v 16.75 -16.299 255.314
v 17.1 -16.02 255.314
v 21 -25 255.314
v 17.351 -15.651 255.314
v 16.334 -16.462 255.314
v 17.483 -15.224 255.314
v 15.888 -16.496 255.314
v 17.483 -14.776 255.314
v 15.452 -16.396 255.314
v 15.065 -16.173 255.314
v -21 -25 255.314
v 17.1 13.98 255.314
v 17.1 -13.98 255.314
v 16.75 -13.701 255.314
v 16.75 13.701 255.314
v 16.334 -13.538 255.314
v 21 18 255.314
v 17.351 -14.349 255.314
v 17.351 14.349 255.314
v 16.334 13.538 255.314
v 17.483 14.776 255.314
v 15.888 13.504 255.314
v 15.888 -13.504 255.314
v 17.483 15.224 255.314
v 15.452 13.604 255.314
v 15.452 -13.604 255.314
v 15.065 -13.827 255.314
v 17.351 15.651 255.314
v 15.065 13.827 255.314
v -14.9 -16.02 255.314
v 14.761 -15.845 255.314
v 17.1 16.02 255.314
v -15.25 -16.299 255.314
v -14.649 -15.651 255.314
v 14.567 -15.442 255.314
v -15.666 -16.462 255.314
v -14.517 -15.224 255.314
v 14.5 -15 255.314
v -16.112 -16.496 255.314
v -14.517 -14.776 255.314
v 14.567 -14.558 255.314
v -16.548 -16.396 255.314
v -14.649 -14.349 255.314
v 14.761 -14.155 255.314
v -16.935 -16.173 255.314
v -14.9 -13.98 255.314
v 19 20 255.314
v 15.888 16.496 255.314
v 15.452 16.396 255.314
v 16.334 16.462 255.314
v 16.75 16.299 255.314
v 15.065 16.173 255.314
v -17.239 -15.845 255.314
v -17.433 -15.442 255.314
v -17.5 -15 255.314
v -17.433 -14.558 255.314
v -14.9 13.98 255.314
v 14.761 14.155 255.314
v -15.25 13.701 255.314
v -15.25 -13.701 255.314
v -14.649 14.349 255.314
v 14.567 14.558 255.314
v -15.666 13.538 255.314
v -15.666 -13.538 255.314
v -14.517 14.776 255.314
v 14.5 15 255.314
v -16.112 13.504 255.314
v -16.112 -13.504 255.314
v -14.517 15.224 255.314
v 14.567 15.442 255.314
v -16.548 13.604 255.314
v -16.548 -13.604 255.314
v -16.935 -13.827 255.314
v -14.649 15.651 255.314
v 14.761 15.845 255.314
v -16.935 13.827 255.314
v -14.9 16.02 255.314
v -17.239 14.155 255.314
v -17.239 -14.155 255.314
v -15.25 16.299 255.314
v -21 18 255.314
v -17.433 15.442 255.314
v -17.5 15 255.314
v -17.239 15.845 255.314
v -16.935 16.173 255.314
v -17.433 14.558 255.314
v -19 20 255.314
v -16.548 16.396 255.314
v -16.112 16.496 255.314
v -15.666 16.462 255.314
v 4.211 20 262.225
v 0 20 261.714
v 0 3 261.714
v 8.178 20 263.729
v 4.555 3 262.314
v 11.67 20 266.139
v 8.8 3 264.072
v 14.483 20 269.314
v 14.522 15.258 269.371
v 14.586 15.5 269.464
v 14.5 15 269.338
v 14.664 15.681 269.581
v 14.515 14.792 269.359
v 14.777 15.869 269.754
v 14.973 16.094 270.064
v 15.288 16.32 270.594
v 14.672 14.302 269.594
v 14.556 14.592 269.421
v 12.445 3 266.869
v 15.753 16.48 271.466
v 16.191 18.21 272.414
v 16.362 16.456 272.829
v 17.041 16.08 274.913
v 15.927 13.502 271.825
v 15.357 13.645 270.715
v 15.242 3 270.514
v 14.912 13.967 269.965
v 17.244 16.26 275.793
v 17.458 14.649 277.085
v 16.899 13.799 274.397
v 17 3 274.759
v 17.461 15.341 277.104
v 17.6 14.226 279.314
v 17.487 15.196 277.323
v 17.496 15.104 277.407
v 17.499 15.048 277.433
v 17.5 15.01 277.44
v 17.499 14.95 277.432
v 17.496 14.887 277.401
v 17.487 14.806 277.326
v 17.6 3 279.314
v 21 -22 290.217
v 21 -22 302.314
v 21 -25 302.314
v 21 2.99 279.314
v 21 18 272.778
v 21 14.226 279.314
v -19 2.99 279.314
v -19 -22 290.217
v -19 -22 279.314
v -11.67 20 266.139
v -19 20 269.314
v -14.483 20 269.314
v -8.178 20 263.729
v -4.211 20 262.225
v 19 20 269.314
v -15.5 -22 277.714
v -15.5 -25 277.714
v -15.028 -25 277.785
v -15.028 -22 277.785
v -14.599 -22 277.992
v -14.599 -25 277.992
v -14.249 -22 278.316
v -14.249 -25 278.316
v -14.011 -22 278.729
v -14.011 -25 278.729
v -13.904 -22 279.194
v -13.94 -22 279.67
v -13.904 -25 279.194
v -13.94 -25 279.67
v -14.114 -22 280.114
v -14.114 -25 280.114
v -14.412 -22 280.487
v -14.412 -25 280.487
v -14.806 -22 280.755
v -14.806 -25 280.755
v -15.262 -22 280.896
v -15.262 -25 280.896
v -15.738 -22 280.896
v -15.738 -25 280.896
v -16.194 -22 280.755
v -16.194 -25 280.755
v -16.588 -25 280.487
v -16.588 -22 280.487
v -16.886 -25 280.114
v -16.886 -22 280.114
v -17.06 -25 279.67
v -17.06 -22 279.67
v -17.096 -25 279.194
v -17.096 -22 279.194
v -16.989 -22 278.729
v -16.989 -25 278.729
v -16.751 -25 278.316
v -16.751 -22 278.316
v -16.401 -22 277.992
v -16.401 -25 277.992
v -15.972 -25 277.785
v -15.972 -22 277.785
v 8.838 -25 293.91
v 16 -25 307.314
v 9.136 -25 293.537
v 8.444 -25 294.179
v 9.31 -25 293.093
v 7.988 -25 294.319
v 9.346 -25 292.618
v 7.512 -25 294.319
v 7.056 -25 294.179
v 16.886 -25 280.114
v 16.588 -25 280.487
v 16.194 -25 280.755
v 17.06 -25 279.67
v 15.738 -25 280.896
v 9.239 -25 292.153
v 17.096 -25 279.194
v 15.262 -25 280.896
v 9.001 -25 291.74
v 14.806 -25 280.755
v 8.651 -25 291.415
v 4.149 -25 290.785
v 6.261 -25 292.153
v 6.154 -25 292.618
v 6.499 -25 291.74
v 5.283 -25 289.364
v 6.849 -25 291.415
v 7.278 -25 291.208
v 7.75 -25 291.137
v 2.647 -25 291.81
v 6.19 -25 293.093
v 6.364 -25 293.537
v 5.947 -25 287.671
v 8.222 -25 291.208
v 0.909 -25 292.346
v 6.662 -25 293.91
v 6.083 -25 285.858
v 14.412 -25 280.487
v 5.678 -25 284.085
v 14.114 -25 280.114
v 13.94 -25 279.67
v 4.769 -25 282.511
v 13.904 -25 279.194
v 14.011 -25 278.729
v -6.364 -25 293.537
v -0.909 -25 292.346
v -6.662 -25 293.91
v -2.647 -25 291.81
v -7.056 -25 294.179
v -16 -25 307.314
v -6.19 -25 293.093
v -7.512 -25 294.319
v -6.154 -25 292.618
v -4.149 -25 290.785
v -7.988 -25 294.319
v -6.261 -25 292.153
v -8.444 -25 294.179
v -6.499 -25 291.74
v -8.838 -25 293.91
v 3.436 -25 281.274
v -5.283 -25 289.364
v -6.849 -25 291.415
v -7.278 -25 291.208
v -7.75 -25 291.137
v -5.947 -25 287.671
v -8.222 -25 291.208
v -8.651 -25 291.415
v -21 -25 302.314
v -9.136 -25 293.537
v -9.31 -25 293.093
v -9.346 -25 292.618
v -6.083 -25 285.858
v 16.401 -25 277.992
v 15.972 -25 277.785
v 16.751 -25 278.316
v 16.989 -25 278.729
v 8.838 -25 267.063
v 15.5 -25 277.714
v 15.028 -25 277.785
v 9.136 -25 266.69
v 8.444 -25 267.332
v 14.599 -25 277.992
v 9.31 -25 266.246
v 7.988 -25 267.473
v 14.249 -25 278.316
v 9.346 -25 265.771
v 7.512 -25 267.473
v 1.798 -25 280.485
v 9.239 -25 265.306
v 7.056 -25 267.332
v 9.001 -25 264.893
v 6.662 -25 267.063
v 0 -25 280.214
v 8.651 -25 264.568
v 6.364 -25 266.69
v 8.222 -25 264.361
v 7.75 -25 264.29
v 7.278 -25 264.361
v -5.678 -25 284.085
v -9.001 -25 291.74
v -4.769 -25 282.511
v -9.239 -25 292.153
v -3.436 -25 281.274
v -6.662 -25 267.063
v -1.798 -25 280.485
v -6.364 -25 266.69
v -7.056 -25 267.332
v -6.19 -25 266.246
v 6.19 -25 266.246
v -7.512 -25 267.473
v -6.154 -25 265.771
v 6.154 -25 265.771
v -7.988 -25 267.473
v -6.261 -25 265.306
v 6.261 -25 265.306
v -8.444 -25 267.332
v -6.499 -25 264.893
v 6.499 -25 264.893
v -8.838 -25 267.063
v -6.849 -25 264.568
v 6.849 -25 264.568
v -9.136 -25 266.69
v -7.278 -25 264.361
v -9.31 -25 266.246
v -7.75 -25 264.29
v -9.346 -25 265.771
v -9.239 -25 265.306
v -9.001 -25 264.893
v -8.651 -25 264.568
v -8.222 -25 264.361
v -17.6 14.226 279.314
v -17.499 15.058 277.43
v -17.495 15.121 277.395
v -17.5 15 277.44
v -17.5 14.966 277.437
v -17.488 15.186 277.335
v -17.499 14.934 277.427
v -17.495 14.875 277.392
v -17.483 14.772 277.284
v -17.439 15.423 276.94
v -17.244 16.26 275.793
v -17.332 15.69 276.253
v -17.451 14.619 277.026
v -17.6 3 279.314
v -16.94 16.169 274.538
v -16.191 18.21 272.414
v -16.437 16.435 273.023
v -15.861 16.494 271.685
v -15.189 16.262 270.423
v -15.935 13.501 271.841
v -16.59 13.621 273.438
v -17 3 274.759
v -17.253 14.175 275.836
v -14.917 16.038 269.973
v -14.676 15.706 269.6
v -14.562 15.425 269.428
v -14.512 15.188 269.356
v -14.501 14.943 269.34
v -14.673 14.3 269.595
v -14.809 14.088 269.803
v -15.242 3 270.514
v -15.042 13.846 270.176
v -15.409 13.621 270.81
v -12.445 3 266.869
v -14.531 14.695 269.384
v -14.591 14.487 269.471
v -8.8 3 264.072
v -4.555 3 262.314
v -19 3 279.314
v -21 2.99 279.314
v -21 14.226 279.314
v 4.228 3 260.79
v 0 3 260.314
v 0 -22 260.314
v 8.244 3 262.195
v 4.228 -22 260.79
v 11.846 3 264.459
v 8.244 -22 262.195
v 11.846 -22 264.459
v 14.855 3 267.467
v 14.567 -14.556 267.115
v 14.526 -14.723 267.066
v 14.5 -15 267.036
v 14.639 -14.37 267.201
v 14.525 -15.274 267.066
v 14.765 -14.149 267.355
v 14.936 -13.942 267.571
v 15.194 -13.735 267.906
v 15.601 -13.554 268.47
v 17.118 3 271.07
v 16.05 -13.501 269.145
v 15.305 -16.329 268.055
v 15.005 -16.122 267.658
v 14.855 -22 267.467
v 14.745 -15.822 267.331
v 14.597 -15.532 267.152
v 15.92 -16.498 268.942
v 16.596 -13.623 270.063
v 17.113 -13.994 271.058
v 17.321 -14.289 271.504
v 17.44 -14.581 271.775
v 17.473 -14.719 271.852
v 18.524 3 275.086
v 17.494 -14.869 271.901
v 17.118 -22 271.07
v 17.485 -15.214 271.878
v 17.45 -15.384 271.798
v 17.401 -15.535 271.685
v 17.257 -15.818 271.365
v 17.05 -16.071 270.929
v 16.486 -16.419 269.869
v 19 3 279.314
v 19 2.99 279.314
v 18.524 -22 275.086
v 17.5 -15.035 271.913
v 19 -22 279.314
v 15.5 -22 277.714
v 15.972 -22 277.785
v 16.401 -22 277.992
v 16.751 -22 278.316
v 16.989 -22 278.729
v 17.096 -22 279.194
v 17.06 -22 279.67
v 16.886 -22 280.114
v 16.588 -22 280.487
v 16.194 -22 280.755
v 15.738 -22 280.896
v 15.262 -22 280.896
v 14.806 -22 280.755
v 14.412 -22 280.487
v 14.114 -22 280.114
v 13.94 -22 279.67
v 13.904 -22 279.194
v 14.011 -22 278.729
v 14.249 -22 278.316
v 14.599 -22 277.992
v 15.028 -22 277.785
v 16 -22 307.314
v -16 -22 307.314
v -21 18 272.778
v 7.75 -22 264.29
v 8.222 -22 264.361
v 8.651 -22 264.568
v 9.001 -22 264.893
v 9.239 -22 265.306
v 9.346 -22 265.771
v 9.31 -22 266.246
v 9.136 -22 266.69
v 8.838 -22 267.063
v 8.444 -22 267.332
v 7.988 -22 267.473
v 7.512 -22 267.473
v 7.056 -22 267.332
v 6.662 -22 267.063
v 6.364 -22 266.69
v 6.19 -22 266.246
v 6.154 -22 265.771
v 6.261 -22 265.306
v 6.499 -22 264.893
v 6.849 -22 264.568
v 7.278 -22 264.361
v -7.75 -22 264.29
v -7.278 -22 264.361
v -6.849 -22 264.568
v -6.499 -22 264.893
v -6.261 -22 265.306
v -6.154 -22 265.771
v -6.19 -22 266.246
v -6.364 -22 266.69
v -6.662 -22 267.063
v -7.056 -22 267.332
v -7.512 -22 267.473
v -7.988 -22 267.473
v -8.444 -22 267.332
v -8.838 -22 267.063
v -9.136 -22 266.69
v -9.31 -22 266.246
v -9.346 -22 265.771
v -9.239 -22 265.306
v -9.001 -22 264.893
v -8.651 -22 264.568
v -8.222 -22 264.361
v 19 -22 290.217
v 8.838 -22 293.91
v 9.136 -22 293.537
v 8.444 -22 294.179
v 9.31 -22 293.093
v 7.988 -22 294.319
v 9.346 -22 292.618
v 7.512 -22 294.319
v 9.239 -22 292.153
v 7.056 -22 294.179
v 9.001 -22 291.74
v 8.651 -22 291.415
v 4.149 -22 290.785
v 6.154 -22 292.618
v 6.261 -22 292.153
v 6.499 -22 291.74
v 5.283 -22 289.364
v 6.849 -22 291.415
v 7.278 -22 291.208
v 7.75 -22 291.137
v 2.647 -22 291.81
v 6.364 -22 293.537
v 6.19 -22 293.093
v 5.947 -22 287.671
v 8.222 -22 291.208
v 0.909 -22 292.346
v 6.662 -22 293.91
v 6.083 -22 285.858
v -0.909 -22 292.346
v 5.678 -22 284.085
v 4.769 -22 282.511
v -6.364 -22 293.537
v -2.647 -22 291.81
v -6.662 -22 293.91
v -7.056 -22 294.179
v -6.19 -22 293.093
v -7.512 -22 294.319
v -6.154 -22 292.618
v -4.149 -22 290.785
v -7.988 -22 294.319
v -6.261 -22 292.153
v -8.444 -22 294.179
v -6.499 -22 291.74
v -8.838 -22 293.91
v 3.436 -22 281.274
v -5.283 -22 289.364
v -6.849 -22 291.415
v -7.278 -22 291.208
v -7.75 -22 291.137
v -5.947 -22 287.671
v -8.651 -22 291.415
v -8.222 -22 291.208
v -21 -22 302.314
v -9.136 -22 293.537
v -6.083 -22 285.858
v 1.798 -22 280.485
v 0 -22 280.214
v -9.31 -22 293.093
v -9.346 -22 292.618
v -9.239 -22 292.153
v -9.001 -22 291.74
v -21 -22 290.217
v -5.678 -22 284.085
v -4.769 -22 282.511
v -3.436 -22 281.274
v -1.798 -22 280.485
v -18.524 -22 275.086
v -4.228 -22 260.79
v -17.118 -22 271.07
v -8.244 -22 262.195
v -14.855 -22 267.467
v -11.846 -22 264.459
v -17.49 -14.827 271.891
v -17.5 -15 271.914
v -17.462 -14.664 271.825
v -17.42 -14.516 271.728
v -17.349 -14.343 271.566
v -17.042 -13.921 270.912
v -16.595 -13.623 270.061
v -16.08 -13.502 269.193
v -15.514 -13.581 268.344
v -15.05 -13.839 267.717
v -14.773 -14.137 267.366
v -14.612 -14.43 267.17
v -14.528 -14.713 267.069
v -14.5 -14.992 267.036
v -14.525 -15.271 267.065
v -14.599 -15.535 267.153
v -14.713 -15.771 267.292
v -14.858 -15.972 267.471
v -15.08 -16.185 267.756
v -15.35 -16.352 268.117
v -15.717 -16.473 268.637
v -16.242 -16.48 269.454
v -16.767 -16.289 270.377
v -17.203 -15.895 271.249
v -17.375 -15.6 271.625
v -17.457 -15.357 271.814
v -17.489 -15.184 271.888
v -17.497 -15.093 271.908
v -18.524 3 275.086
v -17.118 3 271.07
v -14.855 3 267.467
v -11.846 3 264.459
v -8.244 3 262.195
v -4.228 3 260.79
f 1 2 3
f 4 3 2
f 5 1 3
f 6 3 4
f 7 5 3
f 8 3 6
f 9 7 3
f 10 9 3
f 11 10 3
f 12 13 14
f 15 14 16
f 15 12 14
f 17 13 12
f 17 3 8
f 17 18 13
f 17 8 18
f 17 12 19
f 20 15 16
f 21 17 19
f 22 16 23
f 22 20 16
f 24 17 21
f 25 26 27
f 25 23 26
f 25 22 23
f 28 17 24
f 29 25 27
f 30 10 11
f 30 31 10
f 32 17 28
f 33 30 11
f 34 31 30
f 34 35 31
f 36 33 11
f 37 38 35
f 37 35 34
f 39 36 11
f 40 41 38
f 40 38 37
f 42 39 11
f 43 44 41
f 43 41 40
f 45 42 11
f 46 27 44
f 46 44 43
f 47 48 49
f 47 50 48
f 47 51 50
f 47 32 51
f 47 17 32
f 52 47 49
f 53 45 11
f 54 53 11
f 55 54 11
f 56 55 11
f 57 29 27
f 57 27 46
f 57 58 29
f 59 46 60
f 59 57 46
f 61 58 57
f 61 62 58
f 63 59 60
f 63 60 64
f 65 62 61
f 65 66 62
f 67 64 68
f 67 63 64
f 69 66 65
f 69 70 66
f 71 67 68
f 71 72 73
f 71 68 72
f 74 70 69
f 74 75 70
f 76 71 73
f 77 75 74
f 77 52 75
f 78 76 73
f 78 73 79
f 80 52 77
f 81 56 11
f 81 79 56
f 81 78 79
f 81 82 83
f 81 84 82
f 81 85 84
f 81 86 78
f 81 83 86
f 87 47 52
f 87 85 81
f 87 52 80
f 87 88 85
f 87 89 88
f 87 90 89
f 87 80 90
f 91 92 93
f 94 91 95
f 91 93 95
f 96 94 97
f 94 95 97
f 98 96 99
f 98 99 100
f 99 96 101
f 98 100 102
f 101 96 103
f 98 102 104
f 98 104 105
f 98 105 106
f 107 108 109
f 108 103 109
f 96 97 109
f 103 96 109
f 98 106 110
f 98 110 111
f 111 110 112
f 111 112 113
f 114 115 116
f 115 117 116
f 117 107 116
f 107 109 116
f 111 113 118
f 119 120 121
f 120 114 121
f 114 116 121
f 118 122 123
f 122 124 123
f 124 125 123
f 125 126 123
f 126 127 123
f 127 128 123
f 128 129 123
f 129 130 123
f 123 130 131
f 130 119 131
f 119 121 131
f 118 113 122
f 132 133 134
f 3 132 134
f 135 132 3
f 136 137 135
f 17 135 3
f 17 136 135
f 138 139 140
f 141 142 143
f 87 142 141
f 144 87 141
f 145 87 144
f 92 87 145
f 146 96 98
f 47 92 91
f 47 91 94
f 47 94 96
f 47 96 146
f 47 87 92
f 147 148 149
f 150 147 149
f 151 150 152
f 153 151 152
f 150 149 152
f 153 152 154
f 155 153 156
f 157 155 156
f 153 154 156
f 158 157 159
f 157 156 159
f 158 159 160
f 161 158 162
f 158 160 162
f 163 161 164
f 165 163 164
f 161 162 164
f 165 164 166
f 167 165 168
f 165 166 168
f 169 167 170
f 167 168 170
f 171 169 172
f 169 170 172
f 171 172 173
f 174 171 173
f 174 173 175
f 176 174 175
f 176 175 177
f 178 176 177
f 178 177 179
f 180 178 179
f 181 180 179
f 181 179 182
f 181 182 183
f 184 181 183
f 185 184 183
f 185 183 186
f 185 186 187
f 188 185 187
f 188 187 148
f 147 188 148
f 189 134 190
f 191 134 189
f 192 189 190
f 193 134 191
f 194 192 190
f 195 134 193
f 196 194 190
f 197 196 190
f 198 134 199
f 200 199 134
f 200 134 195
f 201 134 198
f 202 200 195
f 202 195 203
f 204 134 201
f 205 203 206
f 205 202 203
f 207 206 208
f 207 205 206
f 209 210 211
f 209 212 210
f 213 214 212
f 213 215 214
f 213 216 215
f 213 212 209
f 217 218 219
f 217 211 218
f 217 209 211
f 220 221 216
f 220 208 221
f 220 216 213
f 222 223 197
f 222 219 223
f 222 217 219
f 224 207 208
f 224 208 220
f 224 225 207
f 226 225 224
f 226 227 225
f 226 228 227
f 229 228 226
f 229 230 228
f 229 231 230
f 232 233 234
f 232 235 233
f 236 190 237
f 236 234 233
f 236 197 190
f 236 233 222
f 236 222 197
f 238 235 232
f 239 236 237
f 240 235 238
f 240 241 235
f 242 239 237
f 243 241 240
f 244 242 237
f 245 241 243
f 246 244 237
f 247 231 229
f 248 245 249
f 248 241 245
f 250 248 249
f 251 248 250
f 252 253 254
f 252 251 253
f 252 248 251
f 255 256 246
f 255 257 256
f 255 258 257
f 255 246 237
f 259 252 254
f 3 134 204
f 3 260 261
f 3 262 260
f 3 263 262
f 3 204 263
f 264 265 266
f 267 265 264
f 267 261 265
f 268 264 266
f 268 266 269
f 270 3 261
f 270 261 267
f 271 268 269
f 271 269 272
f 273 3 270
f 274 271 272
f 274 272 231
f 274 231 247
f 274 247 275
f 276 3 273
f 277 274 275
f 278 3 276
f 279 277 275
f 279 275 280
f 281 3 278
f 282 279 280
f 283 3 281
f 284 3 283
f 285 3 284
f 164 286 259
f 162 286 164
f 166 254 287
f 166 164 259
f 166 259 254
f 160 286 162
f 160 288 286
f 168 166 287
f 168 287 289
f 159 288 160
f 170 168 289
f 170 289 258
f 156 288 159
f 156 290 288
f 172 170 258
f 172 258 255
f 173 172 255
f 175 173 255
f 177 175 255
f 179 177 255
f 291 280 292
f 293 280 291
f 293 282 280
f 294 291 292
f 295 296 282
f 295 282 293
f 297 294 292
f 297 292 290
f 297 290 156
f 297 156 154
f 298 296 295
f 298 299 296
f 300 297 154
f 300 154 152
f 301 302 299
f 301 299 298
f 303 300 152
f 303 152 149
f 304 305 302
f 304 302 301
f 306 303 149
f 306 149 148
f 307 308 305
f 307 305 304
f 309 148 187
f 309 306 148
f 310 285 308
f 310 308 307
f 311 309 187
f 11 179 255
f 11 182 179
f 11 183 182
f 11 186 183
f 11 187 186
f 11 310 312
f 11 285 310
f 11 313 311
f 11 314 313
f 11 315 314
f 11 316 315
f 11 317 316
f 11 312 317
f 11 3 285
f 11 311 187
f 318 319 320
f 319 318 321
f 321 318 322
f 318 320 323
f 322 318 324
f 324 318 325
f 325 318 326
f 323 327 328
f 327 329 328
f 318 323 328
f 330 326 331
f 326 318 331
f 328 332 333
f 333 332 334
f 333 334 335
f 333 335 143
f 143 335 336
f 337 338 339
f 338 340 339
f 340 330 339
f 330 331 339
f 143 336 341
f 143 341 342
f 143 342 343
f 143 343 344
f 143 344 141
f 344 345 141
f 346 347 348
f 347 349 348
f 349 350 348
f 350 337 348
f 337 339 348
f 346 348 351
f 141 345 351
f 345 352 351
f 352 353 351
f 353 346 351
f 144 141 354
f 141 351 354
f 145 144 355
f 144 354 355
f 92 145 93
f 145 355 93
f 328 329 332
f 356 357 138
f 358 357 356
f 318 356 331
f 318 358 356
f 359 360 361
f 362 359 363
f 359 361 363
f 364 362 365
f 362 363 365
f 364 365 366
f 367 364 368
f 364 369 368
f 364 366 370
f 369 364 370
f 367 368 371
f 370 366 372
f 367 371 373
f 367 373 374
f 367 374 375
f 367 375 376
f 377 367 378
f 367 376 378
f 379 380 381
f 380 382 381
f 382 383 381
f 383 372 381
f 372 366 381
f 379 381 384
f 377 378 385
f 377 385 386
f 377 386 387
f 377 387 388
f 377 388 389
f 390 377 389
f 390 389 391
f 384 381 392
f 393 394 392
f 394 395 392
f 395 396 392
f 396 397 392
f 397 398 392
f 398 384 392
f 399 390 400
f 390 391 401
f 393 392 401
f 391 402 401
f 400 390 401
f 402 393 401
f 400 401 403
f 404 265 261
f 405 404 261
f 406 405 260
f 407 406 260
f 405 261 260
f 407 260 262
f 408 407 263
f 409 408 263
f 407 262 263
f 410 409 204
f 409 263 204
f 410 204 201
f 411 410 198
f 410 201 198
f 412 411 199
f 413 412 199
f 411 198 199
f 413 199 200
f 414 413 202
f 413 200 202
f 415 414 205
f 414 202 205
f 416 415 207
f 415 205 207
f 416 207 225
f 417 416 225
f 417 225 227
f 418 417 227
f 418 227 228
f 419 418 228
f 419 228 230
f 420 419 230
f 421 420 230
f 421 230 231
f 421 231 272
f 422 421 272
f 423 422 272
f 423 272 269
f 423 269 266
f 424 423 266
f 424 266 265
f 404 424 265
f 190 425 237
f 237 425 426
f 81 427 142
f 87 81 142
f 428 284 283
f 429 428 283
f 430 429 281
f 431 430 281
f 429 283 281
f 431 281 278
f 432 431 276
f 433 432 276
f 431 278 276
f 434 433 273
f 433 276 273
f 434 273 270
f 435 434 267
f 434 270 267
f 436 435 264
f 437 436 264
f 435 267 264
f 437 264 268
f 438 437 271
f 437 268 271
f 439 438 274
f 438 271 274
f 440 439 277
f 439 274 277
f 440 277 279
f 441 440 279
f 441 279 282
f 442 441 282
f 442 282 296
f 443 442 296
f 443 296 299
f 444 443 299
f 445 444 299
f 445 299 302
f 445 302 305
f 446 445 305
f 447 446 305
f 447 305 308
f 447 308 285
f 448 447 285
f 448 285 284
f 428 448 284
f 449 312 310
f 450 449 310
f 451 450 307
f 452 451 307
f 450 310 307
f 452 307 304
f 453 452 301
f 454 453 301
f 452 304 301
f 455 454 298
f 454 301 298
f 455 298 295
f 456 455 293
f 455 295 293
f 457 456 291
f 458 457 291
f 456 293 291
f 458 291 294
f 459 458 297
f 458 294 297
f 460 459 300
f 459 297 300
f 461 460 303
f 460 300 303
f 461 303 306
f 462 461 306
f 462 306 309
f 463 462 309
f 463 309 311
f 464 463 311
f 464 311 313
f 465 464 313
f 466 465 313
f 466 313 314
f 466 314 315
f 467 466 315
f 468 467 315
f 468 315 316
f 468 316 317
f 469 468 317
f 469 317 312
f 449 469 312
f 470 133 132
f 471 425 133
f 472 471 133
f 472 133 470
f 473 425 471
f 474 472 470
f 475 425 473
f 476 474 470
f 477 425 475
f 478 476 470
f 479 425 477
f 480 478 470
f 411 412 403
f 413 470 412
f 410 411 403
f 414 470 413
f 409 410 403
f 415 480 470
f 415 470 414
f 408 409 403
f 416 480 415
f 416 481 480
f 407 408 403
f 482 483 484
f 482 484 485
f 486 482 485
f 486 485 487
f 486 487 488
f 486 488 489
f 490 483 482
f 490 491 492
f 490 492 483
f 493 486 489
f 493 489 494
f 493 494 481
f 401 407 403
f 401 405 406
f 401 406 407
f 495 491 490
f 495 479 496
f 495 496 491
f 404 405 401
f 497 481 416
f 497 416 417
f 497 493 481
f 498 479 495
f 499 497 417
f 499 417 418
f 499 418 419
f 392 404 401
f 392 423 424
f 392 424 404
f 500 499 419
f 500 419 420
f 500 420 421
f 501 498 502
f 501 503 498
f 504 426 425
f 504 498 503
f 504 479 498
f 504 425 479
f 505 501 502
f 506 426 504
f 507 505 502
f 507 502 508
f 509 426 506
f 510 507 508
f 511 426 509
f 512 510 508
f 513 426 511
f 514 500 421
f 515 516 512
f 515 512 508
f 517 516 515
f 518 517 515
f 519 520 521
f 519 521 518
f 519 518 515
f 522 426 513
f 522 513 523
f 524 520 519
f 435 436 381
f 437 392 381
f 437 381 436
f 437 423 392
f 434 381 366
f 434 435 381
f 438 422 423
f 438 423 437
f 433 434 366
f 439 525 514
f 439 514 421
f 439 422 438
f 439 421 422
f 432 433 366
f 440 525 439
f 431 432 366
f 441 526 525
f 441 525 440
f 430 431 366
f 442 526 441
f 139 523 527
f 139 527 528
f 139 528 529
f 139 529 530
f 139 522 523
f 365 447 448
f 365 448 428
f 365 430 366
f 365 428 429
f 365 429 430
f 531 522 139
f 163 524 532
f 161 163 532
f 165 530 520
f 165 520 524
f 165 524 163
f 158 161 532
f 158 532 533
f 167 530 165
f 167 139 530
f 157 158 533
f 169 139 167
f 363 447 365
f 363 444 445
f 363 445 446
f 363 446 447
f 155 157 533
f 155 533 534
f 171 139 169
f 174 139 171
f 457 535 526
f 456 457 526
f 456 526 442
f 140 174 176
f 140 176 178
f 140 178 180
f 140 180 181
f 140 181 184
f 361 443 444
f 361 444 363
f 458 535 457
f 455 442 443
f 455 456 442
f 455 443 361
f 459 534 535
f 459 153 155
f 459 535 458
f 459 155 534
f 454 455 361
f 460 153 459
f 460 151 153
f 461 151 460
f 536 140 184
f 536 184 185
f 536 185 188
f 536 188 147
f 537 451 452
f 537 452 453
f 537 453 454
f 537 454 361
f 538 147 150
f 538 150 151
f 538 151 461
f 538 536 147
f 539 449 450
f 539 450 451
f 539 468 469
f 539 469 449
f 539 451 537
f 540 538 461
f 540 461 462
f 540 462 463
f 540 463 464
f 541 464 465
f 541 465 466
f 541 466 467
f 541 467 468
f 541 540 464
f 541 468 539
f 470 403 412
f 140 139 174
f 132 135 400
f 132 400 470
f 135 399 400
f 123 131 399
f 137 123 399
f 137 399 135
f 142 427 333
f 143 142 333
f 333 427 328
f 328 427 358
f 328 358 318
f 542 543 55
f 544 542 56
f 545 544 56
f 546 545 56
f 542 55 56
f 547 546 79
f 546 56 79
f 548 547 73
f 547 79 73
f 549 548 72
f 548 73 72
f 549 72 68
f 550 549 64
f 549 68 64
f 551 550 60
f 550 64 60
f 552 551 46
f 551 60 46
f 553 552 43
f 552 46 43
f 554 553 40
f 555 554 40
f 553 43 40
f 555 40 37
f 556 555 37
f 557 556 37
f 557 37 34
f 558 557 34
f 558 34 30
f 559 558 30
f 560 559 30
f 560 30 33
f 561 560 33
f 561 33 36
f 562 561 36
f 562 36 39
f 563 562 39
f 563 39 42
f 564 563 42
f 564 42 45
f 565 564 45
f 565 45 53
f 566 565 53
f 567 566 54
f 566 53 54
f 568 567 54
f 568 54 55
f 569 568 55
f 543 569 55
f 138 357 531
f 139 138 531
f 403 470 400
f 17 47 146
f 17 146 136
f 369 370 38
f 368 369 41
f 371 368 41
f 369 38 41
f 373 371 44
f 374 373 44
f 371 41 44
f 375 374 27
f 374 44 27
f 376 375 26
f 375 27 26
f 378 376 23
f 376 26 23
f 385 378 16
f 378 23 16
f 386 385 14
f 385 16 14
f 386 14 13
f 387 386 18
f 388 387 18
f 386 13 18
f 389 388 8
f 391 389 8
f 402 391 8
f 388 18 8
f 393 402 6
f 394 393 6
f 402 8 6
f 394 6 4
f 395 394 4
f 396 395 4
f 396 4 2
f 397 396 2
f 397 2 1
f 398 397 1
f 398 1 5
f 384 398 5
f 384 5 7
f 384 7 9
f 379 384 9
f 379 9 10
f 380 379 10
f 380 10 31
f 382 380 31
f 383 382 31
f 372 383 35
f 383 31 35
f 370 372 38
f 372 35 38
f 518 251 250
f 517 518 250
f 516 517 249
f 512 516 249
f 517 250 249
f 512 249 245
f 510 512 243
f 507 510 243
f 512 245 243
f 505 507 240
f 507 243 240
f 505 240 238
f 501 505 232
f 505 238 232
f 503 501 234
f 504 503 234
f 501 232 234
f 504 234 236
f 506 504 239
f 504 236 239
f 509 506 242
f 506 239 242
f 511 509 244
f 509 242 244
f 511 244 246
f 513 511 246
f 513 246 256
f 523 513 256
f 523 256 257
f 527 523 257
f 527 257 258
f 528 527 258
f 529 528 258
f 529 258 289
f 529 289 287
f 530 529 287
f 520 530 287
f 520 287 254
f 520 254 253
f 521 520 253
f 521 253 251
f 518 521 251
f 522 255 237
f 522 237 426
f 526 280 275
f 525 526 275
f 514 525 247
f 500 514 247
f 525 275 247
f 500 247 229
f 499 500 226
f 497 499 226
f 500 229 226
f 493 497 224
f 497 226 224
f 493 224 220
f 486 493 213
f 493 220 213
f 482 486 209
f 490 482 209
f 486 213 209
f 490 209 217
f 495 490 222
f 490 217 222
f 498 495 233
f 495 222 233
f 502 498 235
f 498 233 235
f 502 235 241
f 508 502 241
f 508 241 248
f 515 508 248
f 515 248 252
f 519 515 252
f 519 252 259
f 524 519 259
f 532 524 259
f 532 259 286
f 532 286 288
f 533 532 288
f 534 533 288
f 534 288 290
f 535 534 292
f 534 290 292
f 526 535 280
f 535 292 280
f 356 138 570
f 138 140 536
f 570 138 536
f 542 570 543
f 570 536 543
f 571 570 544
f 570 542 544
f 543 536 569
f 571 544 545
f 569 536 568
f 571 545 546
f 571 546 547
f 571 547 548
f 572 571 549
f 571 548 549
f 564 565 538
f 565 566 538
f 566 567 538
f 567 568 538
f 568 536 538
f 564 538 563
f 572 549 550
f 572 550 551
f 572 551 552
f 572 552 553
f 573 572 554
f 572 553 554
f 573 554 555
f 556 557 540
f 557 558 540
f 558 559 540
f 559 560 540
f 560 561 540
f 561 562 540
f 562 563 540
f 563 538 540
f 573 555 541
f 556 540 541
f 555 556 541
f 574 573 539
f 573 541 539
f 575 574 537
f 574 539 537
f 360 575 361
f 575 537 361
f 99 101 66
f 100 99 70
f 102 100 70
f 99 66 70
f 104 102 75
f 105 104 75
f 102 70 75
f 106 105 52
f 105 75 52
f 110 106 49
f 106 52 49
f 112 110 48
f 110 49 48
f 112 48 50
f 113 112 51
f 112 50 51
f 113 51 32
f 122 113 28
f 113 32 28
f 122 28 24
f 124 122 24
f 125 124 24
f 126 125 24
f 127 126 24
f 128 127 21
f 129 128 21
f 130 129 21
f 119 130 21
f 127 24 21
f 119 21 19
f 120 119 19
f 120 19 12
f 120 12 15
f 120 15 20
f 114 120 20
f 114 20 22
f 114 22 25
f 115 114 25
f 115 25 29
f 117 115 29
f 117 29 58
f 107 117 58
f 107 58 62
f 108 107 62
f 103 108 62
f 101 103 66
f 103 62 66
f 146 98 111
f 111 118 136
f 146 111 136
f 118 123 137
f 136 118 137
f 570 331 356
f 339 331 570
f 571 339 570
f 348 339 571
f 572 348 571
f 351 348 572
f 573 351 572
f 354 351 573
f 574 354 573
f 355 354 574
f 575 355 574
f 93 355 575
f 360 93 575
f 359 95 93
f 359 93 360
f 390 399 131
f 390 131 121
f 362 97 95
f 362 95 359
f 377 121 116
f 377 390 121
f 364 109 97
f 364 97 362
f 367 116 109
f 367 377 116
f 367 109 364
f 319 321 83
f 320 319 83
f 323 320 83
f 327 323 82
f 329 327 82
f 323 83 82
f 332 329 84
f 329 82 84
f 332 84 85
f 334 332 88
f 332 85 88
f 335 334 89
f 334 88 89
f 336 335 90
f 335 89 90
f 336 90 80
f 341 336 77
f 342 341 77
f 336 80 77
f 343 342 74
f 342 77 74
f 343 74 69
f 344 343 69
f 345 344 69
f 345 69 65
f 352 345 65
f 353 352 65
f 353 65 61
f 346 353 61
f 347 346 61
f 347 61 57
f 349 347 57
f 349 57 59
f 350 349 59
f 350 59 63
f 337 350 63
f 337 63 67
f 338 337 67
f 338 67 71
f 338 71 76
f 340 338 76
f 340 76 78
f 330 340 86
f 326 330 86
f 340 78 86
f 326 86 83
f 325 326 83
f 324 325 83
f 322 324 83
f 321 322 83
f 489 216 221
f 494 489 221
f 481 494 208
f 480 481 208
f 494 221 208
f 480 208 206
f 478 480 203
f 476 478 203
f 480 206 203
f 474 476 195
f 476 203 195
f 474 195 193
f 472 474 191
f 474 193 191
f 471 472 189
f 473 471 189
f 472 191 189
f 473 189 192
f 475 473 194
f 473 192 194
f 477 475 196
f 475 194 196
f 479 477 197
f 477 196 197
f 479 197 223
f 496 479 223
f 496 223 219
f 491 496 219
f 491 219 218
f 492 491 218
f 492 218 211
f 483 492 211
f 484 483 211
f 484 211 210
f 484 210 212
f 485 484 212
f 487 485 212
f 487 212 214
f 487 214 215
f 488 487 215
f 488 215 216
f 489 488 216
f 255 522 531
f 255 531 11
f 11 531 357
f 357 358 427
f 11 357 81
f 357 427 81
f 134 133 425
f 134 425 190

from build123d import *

# Parameters (mm, degrees)
SKETCH_2_R          = 1.5
EXTRUDE_1_DEPTH     = 52
CUT_EXTRUDE_START   = -3
SKETCH_3_R          = 19
SKETCH_3_R_2        = 1.6
CUT_EXTRUDE_1_DEPTH = 25
SKETCH_3_3_R        = 1.6
CUT_EXTRUDE_2_DEPTH = 25
SKETCH_5_R          = 17.6
CUT_EXTRUDE_3_DEPTH = 310.300460798
SKETCH_6_R          = 6.1
CUT_EXTRUDE_4_DEPTH = 3
CUT_EXTRUDE_5_REACH = 313.3
SKETCH_7_W          = 42
SKETCH_7_H          = 28
CHAMFER_1_SIZE      = 5
CHAMFER_5_SIZE      = 10
CHAMFER_5_SIZE2     = 5.773502692
EXTRUDE_2_DEPTH     = 2


with BuildPart() as part:
    # 草图2 → 凸台-拉伸1 (new body)
    with BuildSketch(Plane(origin=(0, 0, 255.313805399), x_dir=(-1, 0, 0), z_dir=(0, 0, -1))):
        Polygon((21, 18), (19, 20), (-19, 20), (-21, 18), (-21, -25), (21, -25), align=None)
        with Locations((16, -15)):
            Circle(SKETCH_2_R, mode=Mode.SUBTRACT)
        with Locations((16, 15)):
            Circle(SKETCH_2_R, mode=Mode.SUBTRACT)
        with Locations((-16, 15)):
            Circle(SKETCH_2_R, mode=Mode.SUBTRACT)
        with Locations((-16, -15)):
            Circle(SKETCH_2_R, mode=Mode.SUBTRACT)
    extrude(amount=-EXTRUDE_1_DEPTH)

    # 草图3 → 切除-拉伸1 (cut)
    # profile 1 of 7: a face of its own
    with BuildSketch(Plane.XZ.offset(25).offset(CUT_EXTRUDE_START)):
        with Locations(Location((0, 279.313805399, 0), (0, 0, 270))):
            Circle(SKETCH_3_R)
        with Locations((15.5, 279.313805399)):
            Circle(SKETCH_3_R_2, mode=Mode.SUBTRACT)
        with Locations((7.75, 292.737199157)):
            Circle(SKETCH_3_R_2, mode=Mode.SUBTRACT)
        with Locations((-7.75, 292.737199157)):
            Circle(SKETCH_3_R_2, mode=Mode.SUBTRACT)
        with Locations((-15.5, 279.313805399)):
            Circle(SKETCH_3_R_2, mode=Mode.SUBTRACT)
        with Locations((-7.75, 265.89041164)):
            Circle(SKETCH_3_R_2, mode=Mode.SUBTRACT)
        with Locations((7.75, 265.89041164)):
            Circle(SKETCH_3_R_2, mode=Mode.SUBTRACT)
    # profile 2 of 7: a face of its own
    with BuildSketch(Plane.XZ.offset(25).offset(CUT_EXTRUDE_START)):
        with Locations((7.75, 292.737199157)):
            Circle(SKETCH_3_R_2)
    # profile 3 of 7: a face of its own
    with BuildSketch(Plane.XZ.offset(25).offset(CUT_EXTRUDE_START)):
        with Locations((-7.75, 292.737199157)):
            Circle(SKETCH_3_R_2)
    # profile 4 of 7: a face of its own
    with BuildSketch(Plane.XZ.offset(25).offset(CUT_EXTRUDE_START)):
        with Locations((-15.5, 279.313805399)):
            Circle(SKETCH_3_R_2)
    # profile 5 of 7: a face of its own
    with BuildSketch(Plane.XZ.offset(25).offset(CUT_EXTRUDE_START)):
        with Locations((-7.75, 265.89041164)):
            Circle(SKETCH_3_R_2)
    # profile 6 of 7: a face of its own
    with BuildSketch(Plane.XZ.offset(25).offset(CUT_EXTRUDE_START)):
        with Locations((7.75, 265.89041164)):
            Circle(SKETCH_3_R_2)
    # profile 7 of 7: a face of its own
    with BuildSketch(Plane.XZ.offset(25).offset(CUT_EXTRUDE_START)):
        with Locations((15.5, 279.313805399)):
            Circle(SKETCH_3_R_2)
    extrude(amount=-CUT_EXTRUDE_1_DEPTH, mode=Mode.SUBTRACT)

    # 草图3<3> → 切除-拉伸2 (cut)
    with BuildSketch(Plane.XZ.offset(25)):
        with Locations(Location((-7.75, 292.737199157, 0), (0, 0, 270))):
            Circle(SKETCH_3_3_R)
        with Locations(Location((7.75, 292.737199157, 0), (0, 0, 270))):
            Circle(SKETCH_3_3_R)
        with Locations(Location((-15.5, 279.313805399, 0), (0, 0, 270))):
            Circle(SKETCH_3_3_R)
        with Locations(Location((-7.75, 265.89041164, 0), (0, 0, 270))):
            Circle(SKETCH_3_3_R)
        with Locations(Location((7.75, 265.89041164, 0), (0, 0, 270))):
            Circle(SKETCH_3_3_R)
        with Locations(Location((15.5, 279.313805399, 0), (0, 0, 270))):
            Circle(SKETCH_3_3_R)
    extrude(amount=-CUT_EXTRUDE_2_DEPTH, mode=Mode.SUBTRACT)

    # 草图5 → 切除-拉伸3 (cut, through all)
    with BuildSketch(Plane.XZ.offset(-3)):
        with Locations(Location((0, 279.313805399, 0), (0, 0, 270))):
            Circle(SKETCH_5_R)
    extrude(amount=-CUT_EXTRUDE_3_DEPTH, mode=Mode.SUBTRACT)

    # 草图6 → 切除-拉伸4 (cut)
    with BuildSketch(Plane.XZ.offset(25)):
        with Locations(Location((0, 286.313805399, 0), (0, 0, 270))):
            Circle(SKETCH_6_R)
    extrude(amount=-CUT_EXTRUDE_4_DEPTH, mode=Mode.SUBTRACT)

    # 切除-拉伸5: up to this face of the body (flat: up to its plane)
    cut_extrude_5_end = Plane(part.part.faces().sort_by_distance((0, -22, 278.469302594))[0])
    # 草图7 → 切除-拉伸5 (cut, up to the picked face)
    with BuildSketch(Plane(origin=(0, 20, 0), x_dir=(1, 0, 0), z_dir=(0, 1, 0)), mode=Mode.PRIVATE) as cut_extrude_5_sk1:
        with Locations((0, -293.313805399)):
            Rectangle(SKETCH_7_W, SKETCH_7_H)
    cut_extrude_5_tool1 = split(extrude(cut_extrude_5_sk1.sketch, amount=-CUT_EXTRUDE_5_REACH, mode=Mode.PRIVATE), bisect_by=cut_extrude_5_end, keep=Keep.BOTH, mode=Mode.PRIVATE)
    add(cut_extrude_5_tool1.solids().sort_by(Axis((0, 20, 293.313805), (0, -1, 0)))[0], mode=Mode.SUBTRACT)

    # 倒角1
    chamfer_1_edges = [part.edges().sort_by_distance(p)[0] for p in [
        (21, -23.5, 307.313805399),
        (-21, -23.5, 307.313805399),
    ]]
    chamfer(chamfer_1_edges, length=CHAMFER_1_SIZE)

    # 倒角5
    chamfer_5_edges = [part.edges().sort_by_distance(p)[0] for p in [
        (-18.3, 20, 279.313805399),
        (18.3, 20, 279.313805399),
    ]]
    chamfer_5_side = [part.faces().sort_by_distance(p)[0] for p in [
        (0, 20, 255.7632495),
    ]]
    chamfer(chamfer_5_edges, length=CHAMFER_5_SIZE, length2=CHAMFER_5_SIZE2, reference=chamfer_5_side[0])

    # 草图8 → 凸台-拉伸2 (add)
    with BuildSketch(Plane(origin=(21, 0, 0), x_dir=(0, 0, -1), z_dir=(1, 0, 0))):
        Polygon((-279.313805399, -22), (-279.313805399, 2.989978389), (-290.216930942, -22), align=None)
    extrude_2 = extrude(amount=-EXTRUDE_2_DEPTH)

    # 镜向1: 凸台-拉伸2 across plane
    add(extrude_2.mirror(Plane(origin=(0, 0, 0), x_dir=(0, 0, 1), z_dir=(1, 0, 0))))


solid = part.part
